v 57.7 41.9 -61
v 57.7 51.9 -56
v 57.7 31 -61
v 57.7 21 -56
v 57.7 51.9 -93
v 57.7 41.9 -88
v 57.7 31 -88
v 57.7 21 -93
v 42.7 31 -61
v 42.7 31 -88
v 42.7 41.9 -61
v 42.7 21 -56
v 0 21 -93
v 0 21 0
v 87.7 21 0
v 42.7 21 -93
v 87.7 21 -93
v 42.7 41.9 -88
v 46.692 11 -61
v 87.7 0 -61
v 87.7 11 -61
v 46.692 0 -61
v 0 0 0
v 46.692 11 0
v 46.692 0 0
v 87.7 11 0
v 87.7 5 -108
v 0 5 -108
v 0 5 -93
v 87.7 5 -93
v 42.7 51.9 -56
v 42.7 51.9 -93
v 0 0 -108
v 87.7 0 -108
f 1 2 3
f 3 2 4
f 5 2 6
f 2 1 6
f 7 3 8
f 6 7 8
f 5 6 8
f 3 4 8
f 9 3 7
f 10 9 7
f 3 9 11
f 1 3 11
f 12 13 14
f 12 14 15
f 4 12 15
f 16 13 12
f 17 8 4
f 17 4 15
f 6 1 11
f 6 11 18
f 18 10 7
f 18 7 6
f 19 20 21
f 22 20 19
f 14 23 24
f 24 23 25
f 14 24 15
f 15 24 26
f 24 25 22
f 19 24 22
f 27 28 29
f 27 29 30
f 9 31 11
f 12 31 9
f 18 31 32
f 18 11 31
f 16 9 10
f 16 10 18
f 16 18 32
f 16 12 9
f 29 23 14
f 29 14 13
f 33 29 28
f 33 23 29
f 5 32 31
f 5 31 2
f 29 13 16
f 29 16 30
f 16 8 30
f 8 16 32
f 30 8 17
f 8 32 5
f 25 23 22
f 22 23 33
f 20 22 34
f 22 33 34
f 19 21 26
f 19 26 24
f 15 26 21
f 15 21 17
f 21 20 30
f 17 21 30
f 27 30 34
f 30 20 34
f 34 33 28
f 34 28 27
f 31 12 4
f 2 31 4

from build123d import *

# Parameters (mm, degrees)
SKETCH1_W           = 87.7
SKETCH1_H           = 108
BOSS_EXTRUDE1_DEPTH = 21
SKETCH2_W           = 41.008045073
SKETCH2_H           = 61
CUT_EXTRUDE1_DEPTH  = 11
SKETCH5_W           = 87.7
SKETCH5_H           = 15
CUT_EXTRUDE2_DEPTH  = 16
SKETCH7_W           = 15
SKETCH7_H           = 37
BOSS_EXTRUDE2_DEPTH = 30.9
SKETCH8_W           = 27
SKETCH8_H           = 10.9
CUT_EXTRUDE3_DEPTH  = 30.9


with BuildPart() as part:
    # Sketch1 → Boss-Extrude1 (new body)
    with BuildSketch(Plane(origin=(0, 0, 0), x_dir=(1, 0, 0), z_dir=(0, 1, 0))):
        with Locations((43.85, 54)):
            Rectangle(SKETCH1_W, SKETCH1_H)
    extrude(amount=BOSS_EXTRUDE1_DEPTH)

    # Sketch2 → Cut-Extrude1 (cut)
    with BuildSketch(Plane(origin=(0, 0, 0), x_dir=(-1, 0, 0), z_dir=(0, -1, 0))):
        with Locations((-67.195977464, 30.5)):
            Rectangle(SKETCH2_W, SKETCH2_H)
    extrude(amount=-CUT_EXTRUDE1_DEPTH, mode=Mode.SUBTRACT)

    # Sketch5 → Cut-Extrude2 (cut)
    with BuildSketch(Plane(origin=(0, 21, 0), x_dir=(1, 0, 0), z_dir=(0, 1, 0))):
        with Locations((43.85, 100.5)):
            Rectangle(SKETCH5_W, SKETCH5_H)
    extrude(amount=-CUT_EXTRUDE2_DEPTH, mode=Mode.SUBTRACT)

    # Sketch7 → Boss-Extrude2 (add)
    with BuildSketch(Plane(origin=(0, 21, 0), x_dir=(1, 0, 0), z_dir=(0, 1, 0))):
        with Locations((50.2, 74.5)):
            Rectangle(SKETCH7_W, SKETCH7_H)
    extrude(amount=BOSS_EXTRUDE2_DEPTH)

    # Sketch8 → Cut-Extrude3 (cut)
    with BuildSketch(Plane(origin=(57.7, 0, 0), x_dir=(0, 0, -1), z_dir=(1, 0, 0))):
        with Locations((74.5, 36.45)):
            Rectangle(SKETCH8_W, SKETCH8_H)
    extrude(amount=-CUT_EXTRUDE3_DEPTH, mode=Mode.SUBTRACT)


solid = part.part
